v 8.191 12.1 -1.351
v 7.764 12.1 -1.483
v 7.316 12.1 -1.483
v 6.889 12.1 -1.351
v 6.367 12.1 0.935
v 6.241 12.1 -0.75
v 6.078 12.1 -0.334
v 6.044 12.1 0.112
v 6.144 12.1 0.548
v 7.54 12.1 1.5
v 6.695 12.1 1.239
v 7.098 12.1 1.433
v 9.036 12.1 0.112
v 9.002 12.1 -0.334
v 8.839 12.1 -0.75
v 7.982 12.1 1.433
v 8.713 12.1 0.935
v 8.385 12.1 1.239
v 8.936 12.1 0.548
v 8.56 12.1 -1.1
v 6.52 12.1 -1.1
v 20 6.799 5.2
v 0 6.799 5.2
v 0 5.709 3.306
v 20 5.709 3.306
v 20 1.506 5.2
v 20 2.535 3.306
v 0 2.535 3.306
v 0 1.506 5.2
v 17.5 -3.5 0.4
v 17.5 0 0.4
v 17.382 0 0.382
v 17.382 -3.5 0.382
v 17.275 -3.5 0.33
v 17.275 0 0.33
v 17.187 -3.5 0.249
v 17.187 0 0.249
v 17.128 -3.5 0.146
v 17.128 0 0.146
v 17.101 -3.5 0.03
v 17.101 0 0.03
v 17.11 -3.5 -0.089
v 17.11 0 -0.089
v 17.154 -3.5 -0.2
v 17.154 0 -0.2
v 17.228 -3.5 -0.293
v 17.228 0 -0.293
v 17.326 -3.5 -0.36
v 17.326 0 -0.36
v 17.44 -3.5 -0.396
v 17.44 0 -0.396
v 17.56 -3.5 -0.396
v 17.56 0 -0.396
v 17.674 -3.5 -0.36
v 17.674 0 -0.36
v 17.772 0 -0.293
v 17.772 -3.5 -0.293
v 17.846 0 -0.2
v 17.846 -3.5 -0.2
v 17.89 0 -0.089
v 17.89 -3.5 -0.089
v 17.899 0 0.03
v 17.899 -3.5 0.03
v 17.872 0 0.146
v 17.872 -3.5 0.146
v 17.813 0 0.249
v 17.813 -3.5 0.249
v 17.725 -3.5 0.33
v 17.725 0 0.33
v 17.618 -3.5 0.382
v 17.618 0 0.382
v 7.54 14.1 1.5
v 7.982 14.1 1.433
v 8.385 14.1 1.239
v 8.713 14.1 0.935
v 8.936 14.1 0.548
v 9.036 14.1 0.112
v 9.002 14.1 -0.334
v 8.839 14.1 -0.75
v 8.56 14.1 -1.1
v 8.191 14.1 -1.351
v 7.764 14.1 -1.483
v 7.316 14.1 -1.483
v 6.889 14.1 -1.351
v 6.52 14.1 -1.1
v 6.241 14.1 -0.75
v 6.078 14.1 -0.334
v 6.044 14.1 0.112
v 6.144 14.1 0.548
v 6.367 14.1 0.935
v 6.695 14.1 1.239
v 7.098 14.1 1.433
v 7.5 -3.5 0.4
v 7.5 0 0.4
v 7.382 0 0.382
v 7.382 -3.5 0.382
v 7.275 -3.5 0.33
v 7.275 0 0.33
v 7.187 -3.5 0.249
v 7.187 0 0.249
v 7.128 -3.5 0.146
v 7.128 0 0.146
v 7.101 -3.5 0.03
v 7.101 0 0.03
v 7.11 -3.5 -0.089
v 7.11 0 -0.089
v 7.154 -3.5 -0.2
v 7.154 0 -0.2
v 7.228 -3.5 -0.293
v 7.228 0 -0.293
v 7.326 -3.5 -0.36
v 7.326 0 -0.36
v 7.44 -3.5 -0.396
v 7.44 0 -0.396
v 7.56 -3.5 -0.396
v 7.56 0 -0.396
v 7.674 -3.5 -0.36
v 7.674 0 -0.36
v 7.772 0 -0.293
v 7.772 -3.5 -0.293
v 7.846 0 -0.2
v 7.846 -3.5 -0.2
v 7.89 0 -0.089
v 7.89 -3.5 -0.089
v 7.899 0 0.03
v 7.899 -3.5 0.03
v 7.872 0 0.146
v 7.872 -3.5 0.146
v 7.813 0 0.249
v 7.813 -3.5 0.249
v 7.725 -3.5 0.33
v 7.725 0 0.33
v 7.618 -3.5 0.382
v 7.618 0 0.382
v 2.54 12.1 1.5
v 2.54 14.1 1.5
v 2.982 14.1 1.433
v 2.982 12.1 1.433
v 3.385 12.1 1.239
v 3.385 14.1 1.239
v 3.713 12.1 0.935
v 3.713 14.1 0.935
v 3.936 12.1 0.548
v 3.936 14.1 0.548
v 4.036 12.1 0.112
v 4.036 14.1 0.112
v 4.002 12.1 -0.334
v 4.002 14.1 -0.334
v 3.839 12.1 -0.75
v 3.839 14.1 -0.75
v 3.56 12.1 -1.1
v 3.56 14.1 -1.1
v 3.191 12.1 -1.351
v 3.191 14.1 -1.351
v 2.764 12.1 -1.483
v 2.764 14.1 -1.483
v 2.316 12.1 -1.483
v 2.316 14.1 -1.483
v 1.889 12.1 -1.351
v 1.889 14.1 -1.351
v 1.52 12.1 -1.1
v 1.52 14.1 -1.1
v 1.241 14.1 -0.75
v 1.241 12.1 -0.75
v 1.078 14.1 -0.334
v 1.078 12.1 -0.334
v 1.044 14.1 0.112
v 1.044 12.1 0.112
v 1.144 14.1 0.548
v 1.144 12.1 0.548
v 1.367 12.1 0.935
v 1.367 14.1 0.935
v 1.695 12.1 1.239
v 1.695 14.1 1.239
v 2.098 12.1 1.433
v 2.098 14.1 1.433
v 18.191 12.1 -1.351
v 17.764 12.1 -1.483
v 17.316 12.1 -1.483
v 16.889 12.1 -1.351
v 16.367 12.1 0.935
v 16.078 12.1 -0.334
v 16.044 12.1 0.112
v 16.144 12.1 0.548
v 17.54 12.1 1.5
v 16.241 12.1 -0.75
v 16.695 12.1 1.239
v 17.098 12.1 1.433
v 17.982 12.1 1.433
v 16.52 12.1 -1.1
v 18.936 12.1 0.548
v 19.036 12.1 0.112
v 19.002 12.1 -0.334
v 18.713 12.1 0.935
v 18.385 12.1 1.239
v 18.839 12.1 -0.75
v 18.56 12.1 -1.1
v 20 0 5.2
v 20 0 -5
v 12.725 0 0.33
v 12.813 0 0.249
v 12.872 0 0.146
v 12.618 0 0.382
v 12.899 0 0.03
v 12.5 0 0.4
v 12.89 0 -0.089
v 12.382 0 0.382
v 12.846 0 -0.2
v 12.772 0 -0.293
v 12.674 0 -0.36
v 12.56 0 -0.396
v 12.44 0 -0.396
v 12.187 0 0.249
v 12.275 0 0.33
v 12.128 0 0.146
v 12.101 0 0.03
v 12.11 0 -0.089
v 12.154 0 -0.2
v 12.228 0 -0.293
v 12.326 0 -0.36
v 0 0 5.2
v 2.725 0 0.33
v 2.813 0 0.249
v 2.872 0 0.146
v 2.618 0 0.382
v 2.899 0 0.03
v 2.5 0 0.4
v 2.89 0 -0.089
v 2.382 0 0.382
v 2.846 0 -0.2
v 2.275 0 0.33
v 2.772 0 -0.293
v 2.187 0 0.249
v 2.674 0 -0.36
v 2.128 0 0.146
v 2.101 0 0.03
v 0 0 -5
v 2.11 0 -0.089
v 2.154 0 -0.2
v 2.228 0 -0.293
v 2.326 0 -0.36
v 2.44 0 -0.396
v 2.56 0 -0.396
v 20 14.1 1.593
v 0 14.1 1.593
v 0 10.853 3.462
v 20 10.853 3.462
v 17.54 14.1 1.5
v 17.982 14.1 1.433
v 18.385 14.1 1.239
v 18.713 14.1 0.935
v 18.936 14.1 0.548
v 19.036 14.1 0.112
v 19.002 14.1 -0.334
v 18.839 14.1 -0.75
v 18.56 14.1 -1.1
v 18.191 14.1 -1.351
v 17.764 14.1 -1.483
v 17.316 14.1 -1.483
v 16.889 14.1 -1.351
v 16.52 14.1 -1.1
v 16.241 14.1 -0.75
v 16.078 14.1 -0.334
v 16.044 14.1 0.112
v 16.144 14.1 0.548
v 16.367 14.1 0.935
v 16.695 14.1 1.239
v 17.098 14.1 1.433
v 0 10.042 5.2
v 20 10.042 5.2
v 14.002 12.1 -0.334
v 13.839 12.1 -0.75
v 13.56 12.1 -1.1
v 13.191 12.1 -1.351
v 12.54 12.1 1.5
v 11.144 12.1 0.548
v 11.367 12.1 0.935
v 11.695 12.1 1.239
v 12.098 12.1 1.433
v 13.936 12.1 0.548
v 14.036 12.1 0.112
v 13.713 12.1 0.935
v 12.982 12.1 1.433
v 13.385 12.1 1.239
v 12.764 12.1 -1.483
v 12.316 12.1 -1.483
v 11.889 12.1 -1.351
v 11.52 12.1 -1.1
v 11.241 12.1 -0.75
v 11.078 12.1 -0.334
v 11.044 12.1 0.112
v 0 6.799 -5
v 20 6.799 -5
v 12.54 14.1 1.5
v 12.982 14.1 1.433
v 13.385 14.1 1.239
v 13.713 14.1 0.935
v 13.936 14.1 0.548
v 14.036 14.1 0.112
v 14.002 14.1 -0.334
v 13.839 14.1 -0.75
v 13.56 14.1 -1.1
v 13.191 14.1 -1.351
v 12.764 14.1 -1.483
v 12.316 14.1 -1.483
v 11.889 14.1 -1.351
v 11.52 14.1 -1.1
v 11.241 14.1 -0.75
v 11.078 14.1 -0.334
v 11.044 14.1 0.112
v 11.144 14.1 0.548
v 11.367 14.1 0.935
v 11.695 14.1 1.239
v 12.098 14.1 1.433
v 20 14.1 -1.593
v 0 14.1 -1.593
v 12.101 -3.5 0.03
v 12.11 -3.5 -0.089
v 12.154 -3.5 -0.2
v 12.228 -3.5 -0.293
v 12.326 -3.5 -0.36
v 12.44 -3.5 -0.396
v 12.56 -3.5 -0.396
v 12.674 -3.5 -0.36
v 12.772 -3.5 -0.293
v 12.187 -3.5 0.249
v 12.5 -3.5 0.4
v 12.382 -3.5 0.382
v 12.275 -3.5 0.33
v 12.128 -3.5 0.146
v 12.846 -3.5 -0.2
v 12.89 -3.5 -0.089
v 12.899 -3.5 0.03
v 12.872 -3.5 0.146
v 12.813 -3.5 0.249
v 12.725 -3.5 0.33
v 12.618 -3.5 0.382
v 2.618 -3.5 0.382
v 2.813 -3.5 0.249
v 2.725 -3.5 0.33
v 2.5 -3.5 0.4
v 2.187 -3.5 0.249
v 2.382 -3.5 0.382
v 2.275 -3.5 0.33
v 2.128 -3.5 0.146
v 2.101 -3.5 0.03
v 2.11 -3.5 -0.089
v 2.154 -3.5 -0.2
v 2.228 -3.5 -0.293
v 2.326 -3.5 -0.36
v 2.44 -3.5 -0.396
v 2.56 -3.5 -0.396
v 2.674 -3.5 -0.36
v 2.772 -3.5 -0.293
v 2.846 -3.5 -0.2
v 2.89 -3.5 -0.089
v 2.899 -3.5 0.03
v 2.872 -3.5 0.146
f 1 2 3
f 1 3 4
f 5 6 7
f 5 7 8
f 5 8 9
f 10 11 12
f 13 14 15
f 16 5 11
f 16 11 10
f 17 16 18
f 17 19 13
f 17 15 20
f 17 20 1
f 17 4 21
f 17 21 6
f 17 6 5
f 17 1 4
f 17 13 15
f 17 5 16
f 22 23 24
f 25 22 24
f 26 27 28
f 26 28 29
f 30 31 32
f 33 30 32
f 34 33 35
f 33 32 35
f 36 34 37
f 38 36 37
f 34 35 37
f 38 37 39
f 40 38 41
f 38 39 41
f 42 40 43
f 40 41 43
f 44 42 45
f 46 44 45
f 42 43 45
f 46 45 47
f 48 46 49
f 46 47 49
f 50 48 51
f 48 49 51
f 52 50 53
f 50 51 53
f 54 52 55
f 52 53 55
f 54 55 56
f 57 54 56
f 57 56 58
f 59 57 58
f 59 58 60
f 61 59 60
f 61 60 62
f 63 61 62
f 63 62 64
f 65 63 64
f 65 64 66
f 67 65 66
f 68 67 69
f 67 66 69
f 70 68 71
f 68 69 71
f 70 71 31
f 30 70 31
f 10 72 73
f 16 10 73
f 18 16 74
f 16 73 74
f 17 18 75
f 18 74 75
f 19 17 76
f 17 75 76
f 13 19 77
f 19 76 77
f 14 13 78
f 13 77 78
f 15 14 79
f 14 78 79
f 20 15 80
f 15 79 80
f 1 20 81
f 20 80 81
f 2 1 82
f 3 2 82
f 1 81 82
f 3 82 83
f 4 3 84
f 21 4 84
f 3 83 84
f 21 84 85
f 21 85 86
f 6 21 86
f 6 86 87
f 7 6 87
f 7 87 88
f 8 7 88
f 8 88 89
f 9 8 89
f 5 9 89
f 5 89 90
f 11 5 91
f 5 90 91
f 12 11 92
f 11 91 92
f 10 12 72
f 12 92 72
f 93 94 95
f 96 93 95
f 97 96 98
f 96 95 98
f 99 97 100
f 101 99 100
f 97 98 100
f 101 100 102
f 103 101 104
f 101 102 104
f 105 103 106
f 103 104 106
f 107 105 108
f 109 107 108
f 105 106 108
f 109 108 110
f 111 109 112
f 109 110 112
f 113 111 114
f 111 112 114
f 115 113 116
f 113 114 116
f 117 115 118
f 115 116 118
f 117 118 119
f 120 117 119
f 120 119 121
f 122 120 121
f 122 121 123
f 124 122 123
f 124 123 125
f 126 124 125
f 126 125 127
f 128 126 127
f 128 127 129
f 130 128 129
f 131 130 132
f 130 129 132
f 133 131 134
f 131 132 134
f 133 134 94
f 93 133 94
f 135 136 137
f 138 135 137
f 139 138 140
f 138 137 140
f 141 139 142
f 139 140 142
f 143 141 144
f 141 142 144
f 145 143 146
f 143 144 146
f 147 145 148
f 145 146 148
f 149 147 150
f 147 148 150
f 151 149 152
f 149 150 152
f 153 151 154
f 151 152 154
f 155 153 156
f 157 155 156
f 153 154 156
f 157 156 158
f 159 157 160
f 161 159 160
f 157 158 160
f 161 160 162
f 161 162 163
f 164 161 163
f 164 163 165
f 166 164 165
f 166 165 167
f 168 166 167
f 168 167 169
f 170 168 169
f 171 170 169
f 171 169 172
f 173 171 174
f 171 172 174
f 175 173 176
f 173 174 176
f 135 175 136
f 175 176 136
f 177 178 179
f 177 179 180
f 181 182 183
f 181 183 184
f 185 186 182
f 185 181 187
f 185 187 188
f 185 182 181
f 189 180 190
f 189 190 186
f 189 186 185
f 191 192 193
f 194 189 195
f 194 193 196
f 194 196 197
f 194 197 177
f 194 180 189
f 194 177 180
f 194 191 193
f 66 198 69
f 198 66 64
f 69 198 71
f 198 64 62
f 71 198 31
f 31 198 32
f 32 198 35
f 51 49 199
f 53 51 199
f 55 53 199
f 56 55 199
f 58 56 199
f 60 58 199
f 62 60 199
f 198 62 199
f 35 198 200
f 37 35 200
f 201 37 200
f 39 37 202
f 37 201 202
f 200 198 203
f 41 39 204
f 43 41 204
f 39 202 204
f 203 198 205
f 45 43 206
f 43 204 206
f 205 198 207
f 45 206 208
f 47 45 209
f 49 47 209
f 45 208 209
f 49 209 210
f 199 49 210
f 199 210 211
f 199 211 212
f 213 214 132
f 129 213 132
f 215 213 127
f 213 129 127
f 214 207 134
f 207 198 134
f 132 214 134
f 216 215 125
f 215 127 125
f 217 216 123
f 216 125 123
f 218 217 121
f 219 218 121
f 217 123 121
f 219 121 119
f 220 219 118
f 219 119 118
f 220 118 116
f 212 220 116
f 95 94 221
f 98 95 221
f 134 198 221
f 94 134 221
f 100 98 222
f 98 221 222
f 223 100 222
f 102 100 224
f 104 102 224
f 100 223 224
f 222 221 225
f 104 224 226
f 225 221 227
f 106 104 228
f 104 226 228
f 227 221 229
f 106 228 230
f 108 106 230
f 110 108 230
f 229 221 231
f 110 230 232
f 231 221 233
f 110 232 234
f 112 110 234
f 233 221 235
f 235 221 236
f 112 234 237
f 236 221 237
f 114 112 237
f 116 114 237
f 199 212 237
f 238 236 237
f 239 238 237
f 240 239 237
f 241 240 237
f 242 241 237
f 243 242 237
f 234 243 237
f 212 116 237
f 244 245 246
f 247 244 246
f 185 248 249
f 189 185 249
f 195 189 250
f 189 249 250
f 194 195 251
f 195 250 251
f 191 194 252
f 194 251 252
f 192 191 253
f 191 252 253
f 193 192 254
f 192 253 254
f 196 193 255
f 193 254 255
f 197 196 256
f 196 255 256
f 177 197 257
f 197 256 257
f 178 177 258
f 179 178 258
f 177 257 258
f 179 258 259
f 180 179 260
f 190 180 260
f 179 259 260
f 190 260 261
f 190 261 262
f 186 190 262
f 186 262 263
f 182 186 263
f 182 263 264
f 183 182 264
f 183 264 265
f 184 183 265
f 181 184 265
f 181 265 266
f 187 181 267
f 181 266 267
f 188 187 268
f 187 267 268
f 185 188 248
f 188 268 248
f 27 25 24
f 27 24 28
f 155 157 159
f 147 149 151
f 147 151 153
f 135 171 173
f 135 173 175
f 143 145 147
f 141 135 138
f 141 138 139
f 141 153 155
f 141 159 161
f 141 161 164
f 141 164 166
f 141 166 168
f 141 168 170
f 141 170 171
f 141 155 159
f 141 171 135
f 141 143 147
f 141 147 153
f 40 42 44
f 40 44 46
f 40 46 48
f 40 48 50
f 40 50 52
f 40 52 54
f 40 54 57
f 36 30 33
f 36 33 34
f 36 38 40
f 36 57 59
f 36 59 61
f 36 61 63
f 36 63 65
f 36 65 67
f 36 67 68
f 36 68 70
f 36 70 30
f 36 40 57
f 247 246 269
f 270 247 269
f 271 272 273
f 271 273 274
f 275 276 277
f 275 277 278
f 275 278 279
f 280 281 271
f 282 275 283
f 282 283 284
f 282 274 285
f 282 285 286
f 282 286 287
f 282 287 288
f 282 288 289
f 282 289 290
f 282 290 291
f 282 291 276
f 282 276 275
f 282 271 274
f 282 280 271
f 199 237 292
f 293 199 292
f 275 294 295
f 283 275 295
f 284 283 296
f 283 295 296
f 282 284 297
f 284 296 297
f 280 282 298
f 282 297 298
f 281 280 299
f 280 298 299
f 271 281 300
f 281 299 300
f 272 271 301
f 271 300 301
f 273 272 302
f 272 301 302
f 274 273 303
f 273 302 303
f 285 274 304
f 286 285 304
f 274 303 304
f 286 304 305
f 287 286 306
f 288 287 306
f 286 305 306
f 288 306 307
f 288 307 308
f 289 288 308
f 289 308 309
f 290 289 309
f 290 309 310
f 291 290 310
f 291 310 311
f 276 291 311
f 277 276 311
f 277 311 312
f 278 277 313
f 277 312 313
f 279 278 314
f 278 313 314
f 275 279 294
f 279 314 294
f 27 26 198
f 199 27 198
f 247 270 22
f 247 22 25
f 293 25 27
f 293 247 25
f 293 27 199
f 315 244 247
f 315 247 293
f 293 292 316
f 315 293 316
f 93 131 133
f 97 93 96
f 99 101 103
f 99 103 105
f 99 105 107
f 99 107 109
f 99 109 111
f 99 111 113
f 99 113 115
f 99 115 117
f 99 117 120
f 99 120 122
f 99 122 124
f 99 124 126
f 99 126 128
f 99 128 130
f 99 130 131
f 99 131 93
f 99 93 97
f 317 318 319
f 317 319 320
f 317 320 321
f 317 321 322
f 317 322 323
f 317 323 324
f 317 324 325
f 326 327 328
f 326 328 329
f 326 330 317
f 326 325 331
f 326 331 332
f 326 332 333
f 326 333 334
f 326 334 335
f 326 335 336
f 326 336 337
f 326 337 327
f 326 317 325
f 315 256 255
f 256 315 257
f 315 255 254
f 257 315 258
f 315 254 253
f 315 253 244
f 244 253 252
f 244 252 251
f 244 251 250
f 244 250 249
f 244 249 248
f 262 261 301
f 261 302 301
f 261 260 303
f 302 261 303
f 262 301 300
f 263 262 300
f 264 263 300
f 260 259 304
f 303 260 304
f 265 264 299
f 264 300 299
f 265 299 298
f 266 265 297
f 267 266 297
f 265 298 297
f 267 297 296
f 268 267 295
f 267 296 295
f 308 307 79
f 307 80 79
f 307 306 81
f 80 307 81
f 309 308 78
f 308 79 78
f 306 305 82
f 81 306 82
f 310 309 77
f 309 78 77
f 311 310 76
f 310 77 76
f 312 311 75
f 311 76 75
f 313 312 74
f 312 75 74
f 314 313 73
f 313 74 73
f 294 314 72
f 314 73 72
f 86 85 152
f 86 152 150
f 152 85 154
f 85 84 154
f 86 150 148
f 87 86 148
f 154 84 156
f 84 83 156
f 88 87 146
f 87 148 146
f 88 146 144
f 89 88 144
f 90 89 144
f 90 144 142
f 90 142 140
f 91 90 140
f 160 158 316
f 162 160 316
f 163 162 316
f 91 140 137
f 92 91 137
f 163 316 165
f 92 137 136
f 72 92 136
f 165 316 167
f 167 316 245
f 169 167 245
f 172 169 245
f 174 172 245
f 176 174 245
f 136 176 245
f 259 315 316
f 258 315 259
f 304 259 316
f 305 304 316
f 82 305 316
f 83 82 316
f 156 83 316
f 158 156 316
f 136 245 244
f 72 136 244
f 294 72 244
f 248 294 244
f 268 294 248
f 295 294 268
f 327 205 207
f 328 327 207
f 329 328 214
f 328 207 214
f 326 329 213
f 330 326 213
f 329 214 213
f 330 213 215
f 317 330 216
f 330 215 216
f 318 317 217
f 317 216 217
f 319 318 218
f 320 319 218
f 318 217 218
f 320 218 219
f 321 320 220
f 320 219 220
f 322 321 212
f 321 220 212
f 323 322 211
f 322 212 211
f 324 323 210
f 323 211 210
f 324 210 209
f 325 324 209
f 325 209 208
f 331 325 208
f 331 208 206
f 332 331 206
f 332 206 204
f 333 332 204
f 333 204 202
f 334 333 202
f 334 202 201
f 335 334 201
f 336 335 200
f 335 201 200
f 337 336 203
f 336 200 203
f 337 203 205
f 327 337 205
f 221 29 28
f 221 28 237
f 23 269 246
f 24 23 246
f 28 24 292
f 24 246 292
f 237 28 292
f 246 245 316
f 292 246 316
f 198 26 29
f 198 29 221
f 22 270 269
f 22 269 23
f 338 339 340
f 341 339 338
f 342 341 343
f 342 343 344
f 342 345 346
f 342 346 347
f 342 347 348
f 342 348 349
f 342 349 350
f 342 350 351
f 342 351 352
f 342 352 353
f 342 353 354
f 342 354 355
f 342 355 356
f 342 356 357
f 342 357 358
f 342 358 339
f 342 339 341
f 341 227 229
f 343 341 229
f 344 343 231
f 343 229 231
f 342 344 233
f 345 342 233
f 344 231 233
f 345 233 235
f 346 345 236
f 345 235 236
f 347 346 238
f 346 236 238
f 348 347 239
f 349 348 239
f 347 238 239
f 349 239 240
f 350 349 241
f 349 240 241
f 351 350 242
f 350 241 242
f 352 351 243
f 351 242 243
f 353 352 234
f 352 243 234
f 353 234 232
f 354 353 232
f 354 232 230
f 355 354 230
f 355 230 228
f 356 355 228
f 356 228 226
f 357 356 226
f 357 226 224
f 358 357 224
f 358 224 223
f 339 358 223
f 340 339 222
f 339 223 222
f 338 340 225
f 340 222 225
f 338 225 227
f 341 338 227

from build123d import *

# Parameters (mm, degrees)
EXTRUDE_1_DEPTH     = 20
SKETCH_2_R          = 1.5
CUT_EXTRUDE_1_DEPTH = 2
SKETCH_3_R          = 0.4
EXTRUDE_2_DEPTH     = 3.5


with BuildPart() as part:
    # 草图1 → 凸台-拉伸1 (new body)
    with BuildSketch(Plane(origin=(0, 0, 0), x_dir=(0, 0, -1), z_dir=(1, 0, 0))):
        Polygon((0, 0), (5, 0), (5, 6.798949449), (1.592861235, 14.1), (-1.592861235, 14.1), (-3.462246636, 10.852770352), (-5.2, 10.041823104), (-5.2, 6.798949449), (-3.305827132, 5.708500208), (-3.305827132, 2.534594125), (-5.2, 1.506142854), (-5.2, 0), align=None)
    extrude(amount=EXTRUDE_1_DEPTH)

    # 草图2 → 切除-拉伸1 (cut)
    with BuildSketch(Plane(origin=(0, 14.1, 0), x_dir=(1, 0, 0), z_dir=(0, 1, 0))):
        with Locations(Location((2.54, 0, 0), (0, 0, 270))):
            Circle(SKETCH_2_R)
        with Locations(Location((7.54, 0, 0), (0, 0, 270))):
            Circle(SKETCH_2_R)
        with Locations(Location((12.54, 0, 0), (0, 0, 270))):
            Circle(SKETCH_2_R)
        with Locations(Location((17.54, 0, 0), (0, 0, 270))):
            Circle(SKETCH_2_R)
    extrude(amount=-CUT_EXTRUDE_1_DEPTH, mode=Mode.SUBTRACT)

    # 草图3 → 凸台-拉伸2 (add)
    with BuildSketch(Plane.XZ):
        with Locations(Location((2.5, 0, 0), (0, 0, 90))):
            Circle(SKETCH_3_R)
        with Locations(Location((7.5, 0, 0), (0, 0, 90))):
            Circle(SKETCH_3_R)
        with Locations(Location((12.5, 0, 0), (0, 0, 90))):
            Circle(SKETCH_3_R)
        with Locations(Location((17.5, 0, 0), (0, 0, 90))):
            Circle(SKETCH_3_R)
    extrude(amount=EXTRUDE_2_DEPTH)


solid = part.part
